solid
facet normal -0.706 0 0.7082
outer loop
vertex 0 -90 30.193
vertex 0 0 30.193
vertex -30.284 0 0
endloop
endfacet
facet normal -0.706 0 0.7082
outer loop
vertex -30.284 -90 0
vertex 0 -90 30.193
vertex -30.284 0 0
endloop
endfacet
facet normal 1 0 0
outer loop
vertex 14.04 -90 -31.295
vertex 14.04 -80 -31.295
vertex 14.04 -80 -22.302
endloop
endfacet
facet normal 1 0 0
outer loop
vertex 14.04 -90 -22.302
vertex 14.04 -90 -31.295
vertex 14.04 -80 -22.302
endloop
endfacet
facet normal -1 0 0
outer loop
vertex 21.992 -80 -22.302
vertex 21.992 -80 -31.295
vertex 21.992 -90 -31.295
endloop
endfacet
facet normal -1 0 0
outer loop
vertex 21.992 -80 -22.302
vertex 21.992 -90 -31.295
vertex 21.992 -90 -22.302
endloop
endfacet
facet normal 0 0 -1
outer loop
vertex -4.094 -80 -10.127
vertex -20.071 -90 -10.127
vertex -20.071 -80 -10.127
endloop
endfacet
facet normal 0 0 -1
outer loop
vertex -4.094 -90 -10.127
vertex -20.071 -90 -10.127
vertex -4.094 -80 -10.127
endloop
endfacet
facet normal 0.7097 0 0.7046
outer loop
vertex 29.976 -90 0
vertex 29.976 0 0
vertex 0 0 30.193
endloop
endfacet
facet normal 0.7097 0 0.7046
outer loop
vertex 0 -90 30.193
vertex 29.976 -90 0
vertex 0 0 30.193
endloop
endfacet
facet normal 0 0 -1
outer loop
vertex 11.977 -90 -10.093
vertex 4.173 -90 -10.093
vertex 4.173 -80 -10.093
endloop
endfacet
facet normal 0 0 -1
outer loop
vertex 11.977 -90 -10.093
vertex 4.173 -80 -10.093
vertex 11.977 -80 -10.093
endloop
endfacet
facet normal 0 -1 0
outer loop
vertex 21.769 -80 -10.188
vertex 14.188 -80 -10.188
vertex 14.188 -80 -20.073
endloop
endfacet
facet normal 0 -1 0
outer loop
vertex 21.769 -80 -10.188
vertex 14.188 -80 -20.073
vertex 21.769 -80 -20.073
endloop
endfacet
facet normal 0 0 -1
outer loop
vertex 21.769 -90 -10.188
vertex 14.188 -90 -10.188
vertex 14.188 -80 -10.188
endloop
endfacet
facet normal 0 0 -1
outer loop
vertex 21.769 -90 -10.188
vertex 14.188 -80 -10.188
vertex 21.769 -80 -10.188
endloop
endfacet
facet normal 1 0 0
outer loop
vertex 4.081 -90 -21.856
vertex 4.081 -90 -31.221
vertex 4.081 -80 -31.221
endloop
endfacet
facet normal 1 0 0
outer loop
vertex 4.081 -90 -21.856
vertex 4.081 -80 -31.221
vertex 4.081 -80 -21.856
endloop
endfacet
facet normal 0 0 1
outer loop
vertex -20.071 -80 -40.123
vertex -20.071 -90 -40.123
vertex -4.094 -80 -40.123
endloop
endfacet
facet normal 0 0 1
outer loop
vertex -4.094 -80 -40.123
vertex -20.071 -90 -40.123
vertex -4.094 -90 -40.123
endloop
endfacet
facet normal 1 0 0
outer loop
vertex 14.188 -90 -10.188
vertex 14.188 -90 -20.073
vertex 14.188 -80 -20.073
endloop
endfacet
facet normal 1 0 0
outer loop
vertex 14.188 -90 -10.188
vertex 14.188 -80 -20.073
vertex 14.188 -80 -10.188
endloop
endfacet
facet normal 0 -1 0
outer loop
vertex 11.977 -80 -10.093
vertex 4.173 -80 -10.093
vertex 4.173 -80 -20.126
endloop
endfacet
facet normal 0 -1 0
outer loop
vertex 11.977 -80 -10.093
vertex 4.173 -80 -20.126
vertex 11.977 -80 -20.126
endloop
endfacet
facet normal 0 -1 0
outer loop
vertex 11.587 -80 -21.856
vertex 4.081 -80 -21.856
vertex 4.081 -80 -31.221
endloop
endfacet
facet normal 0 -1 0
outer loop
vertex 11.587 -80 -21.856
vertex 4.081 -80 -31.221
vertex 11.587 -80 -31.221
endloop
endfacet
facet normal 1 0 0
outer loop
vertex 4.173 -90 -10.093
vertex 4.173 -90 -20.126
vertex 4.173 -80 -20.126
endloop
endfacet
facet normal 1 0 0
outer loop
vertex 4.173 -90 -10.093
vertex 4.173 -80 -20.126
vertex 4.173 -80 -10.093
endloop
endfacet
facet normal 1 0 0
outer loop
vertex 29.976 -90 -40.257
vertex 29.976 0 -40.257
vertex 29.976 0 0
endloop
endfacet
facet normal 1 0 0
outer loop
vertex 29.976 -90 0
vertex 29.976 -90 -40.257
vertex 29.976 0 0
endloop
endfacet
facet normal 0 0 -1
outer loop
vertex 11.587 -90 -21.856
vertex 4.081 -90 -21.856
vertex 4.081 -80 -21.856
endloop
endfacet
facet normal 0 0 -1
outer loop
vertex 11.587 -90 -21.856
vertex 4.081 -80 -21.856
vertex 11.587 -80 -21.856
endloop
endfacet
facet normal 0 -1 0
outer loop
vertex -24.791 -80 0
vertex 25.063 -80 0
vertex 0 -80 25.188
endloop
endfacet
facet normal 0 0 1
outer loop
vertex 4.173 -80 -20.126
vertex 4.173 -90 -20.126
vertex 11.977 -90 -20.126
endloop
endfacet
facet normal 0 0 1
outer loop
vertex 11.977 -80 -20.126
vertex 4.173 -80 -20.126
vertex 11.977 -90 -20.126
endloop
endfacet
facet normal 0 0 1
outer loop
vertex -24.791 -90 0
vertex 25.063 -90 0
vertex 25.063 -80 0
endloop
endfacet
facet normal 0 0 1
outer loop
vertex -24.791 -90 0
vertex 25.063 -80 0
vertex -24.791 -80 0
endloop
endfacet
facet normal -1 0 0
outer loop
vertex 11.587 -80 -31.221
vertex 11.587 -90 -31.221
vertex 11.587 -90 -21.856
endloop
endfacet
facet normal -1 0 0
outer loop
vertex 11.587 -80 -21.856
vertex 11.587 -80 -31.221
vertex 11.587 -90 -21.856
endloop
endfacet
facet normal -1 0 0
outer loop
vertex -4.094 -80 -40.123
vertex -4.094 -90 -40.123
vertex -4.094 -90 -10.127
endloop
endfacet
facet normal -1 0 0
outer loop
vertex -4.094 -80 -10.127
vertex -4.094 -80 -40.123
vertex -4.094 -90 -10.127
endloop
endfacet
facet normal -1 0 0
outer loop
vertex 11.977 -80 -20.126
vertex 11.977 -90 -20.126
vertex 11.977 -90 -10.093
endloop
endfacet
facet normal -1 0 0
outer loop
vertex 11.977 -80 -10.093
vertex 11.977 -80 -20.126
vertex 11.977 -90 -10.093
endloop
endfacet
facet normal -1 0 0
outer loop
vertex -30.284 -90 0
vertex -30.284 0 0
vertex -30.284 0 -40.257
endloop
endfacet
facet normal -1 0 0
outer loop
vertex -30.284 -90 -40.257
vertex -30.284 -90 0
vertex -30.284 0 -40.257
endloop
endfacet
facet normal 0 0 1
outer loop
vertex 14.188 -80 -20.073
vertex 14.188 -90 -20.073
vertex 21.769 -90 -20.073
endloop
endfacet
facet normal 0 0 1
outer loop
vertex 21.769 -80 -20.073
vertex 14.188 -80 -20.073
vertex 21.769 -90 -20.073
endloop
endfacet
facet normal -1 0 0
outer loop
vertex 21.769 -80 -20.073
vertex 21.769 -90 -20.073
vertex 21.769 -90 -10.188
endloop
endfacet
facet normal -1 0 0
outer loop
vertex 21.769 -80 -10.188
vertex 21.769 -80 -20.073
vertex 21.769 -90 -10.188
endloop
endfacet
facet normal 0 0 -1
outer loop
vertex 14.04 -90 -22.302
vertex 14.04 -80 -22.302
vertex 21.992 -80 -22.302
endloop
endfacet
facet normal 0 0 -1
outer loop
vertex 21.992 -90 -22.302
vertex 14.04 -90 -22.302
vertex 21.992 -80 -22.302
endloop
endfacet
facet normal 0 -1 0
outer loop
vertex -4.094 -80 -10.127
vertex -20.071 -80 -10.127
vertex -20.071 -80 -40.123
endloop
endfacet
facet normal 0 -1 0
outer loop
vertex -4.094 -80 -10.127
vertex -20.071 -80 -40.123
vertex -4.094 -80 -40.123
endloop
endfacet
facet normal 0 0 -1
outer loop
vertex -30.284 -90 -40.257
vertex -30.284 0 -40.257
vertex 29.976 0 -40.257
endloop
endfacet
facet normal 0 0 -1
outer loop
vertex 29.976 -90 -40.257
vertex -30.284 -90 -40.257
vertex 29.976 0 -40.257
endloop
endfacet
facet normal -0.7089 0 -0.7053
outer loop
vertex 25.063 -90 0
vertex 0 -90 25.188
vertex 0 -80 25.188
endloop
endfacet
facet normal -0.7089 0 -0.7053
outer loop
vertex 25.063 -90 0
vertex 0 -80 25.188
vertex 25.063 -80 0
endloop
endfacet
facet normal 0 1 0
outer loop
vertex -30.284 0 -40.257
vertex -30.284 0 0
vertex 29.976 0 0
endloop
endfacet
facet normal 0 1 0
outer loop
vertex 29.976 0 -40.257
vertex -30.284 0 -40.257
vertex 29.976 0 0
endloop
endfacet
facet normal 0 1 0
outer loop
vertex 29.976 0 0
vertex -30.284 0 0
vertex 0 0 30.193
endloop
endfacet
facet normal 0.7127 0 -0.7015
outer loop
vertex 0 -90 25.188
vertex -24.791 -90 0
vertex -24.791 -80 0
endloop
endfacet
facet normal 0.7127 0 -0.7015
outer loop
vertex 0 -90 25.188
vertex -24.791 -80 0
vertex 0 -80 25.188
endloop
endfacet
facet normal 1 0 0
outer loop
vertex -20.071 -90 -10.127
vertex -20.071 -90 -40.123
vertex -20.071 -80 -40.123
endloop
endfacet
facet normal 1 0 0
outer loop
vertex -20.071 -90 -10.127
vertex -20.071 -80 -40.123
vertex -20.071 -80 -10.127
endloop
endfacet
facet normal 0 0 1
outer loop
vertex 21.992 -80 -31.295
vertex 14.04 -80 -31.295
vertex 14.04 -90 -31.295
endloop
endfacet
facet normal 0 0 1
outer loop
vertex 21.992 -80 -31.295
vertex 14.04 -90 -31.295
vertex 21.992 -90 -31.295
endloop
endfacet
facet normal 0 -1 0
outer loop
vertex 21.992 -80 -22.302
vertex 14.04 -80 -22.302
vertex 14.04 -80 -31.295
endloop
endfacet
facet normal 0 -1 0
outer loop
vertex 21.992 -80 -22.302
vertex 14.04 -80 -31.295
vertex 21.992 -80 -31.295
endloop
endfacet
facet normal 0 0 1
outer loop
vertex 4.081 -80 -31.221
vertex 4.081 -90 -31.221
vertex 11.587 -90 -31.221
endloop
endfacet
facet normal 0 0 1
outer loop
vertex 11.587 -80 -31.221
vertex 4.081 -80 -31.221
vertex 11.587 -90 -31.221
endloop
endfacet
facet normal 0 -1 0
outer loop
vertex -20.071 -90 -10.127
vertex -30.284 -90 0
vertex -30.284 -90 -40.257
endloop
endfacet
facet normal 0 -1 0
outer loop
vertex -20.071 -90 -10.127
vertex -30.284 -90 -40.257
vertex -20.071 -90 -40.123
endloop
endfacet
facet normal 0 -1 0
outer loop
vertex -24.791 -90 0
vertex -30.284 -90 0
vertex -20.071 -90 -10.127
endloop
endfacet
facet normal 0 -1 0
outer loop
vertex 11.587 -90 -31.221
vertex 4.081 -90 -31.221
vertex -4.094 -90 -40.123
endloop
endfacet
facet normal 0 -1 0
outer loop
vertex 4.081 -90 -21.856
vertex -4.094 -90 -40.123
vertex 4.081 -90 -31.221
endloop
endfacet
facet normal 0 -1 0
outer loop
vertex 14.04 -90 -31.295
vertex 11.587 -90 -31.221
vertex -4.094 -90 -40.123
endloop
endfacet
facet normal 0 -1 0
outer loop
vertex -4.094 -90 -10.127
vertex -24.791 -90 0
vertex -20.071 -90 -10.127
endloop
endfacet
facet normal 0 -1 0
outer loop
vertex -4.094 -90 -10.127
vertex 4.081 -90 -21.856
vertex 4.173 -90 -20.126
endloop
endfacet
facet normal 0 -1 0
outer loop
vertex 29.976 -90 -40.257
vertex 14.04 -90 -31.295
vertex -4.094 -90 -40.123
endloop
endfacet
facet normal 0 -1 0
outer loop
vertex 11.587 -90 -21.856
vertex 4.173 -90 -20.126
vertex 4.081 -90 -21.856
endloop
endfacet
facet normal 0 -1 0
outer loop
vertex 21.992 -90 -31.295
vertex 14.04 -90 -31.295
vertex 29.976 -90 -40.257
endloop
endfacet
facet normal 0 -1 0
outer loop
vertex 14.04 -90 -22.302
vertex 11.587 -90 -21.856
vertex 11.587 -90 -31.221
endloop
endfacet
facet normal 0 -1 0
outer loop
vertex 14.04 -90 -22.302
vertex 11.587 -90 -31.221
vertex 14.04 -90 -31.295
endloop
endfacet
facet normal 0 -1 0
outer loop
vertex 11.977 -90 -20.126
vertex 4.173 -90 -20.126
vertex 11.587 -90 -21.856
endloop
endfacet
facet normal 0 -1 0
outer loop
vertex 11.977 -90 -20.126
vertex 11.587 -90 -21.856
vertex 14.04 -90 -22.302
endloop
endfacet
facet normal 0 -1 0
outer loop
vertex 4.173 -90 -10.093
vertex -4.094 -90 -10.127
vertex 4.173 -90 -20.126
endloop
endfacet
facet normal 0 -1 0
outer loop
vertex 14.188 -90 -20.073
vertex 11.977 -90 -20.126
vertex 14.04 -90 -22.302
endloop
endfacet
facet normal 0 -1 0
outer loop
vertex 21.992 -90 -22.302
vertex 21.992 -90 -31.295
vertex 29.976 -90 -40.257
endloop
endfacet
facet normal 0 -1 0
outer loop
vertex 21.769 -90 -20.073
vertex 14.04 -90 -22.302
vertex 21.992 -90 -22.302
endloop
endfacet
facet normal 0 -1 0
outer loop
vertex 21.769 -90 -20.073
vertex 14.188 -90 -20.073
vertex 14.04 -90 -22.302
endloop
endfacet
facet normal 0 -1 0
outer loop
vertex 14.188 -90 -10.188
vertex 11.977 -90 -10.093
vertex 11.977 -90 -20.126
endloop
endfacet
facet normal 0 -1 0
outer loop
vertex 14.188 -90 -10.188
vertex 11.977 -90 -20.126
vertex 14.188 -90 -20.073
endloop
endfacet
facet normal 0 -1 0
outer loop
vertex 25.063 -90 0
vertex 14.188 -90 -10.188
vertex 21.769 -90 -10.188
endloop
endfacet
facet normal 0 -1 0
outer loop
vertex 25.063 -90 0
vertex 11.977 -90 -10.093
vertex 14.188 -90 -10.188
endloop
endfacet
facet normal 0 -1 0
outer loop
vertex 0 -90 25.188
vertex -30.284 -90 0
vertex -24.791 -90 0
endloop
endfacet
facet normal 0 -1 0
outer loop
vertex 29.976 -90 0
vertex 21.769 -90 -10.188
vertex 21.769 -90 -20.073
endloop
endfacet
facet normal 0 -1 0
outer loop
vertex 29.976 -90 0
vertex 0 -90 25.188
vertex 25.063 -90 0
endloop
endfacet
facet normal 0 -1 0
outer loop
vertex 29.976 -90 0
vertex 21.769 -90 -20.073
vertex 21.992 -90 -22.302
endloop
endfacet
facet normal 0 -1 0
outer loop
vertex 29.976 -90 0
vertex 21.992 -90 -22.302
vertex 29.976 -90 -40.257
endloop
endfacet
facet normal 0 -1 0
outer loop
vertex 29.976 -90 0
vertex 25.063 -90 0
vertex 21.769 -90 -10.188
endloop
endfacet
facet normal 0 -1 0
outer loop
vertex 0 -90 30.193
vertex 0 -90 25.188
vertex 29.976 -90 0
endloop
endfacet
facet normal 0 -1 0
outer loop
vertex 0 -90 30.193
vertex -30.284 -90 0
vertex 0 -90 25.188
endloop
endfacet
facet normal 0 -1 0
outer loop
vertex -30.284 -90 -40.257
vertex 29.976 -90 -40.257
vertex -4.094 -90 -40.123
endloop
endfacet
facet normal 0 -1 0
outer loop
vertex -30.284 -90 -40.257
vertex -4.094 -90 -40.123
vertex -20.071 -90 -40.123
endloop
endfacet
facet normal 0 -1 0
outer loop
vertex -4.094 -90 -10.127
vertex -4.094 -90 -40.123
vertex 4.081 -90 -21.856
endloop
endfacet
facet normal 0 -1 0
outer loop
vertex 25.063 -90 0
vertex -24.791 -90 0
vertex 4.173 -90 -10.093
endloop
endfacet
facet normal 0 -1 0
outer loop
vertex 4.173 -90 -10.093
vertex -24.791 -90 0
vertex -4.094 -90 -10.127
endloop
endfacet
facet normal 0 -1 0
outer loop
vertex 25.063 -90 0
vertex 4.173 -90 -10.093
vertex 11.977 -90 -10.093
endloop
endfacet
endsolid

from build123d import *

# Parameters (mm, degrees)
PAD_DEPTH       = 90
POCKET_DEPTH    = 10
SKETCH002_W     = 15.977638
SKETCH002_H     = 29.995947
POCKET001_DEPTH = 10
SKETCH003_W     = 7.803505
SKETCH003_H     = 10.033076
POCKET002_DEPTH = 10
SKETCH004_W     = 7.580546
SKETCH004_H     = 9.884439
SKETCH004_W_2   = 7.506227
SKETCH004_H_2   = 9.364204
SKETCH004_W_3   = 7.952141
SKETCH004_H_3   = 8.992611
POCKET003_DEPTH = 10


with BuildPart() as part:
    # Sketch → Pad (new body)
    with BuildSketch(Plane.XZ):
        Polygon((0, 30.192584), (-30.283876, 0), (-30.283876, -40.257482), (29.976444, -40.257482), (29.976444, 0), align=None)
    extrude(amount=PAD_DEPTH)

    # Sketch001 (on Face7 of Pad) → Pocket (cut)
    with BuildSketch(Plane.XZ.offset(90)):
        Polygon((0, 25.187876), (25.062579, 0), (-24.79101, 0), align=None)
    extrude(amount=-POCKET_DEPTH, mode=Mode.SUBTRACT)

    # Sketch002 (on Face5 of Pocket) → Pocket001 (cut)
    with BuildSketch(Plane.XZ.offset(90)):
        with Locations((-12.082496, -25.124813)):
            Rectangle(SKETCH002_W, SKETCH002_H)
    extrude(amount=-POCKET001_DEPTH, mode=Mode.SUBTRACT)

    # Sketch003 (on Face5 of Pocket001) → Pocket002 (cut)
    with BuildSketch(Plane.XZ.offset(90)):
        with Locations((8.075235, -15.109341)):
            Rectangle(SKETCH003_W, SKETCH003_H)
    extrude(amount=-POCKET002_DEPTH, mode=Mode.SUBTRACT)

    # Sketch004 (on Face5 of Pocket002) → Pocket003 (cut)
    with BuildSketch(Plane.XZ.offset(90)):
        with Locations((17.978553, -15.130553)):
            Rectangle(SKETCH004_W, SKETCH004_H)
        with Locations((7.833998, -26.538534)):
            Rectangle(SKETCH004_W_2, SKETCH004_H_2)
        with Locations((18.015712, -26.798651)):
            Rectangle(SKETCH004_W_3, SKETCH004_H_3)
    extrude(amount=-POCKET003_DEPTH, mode=Mode.SUBTRACT)


solid = part.part
